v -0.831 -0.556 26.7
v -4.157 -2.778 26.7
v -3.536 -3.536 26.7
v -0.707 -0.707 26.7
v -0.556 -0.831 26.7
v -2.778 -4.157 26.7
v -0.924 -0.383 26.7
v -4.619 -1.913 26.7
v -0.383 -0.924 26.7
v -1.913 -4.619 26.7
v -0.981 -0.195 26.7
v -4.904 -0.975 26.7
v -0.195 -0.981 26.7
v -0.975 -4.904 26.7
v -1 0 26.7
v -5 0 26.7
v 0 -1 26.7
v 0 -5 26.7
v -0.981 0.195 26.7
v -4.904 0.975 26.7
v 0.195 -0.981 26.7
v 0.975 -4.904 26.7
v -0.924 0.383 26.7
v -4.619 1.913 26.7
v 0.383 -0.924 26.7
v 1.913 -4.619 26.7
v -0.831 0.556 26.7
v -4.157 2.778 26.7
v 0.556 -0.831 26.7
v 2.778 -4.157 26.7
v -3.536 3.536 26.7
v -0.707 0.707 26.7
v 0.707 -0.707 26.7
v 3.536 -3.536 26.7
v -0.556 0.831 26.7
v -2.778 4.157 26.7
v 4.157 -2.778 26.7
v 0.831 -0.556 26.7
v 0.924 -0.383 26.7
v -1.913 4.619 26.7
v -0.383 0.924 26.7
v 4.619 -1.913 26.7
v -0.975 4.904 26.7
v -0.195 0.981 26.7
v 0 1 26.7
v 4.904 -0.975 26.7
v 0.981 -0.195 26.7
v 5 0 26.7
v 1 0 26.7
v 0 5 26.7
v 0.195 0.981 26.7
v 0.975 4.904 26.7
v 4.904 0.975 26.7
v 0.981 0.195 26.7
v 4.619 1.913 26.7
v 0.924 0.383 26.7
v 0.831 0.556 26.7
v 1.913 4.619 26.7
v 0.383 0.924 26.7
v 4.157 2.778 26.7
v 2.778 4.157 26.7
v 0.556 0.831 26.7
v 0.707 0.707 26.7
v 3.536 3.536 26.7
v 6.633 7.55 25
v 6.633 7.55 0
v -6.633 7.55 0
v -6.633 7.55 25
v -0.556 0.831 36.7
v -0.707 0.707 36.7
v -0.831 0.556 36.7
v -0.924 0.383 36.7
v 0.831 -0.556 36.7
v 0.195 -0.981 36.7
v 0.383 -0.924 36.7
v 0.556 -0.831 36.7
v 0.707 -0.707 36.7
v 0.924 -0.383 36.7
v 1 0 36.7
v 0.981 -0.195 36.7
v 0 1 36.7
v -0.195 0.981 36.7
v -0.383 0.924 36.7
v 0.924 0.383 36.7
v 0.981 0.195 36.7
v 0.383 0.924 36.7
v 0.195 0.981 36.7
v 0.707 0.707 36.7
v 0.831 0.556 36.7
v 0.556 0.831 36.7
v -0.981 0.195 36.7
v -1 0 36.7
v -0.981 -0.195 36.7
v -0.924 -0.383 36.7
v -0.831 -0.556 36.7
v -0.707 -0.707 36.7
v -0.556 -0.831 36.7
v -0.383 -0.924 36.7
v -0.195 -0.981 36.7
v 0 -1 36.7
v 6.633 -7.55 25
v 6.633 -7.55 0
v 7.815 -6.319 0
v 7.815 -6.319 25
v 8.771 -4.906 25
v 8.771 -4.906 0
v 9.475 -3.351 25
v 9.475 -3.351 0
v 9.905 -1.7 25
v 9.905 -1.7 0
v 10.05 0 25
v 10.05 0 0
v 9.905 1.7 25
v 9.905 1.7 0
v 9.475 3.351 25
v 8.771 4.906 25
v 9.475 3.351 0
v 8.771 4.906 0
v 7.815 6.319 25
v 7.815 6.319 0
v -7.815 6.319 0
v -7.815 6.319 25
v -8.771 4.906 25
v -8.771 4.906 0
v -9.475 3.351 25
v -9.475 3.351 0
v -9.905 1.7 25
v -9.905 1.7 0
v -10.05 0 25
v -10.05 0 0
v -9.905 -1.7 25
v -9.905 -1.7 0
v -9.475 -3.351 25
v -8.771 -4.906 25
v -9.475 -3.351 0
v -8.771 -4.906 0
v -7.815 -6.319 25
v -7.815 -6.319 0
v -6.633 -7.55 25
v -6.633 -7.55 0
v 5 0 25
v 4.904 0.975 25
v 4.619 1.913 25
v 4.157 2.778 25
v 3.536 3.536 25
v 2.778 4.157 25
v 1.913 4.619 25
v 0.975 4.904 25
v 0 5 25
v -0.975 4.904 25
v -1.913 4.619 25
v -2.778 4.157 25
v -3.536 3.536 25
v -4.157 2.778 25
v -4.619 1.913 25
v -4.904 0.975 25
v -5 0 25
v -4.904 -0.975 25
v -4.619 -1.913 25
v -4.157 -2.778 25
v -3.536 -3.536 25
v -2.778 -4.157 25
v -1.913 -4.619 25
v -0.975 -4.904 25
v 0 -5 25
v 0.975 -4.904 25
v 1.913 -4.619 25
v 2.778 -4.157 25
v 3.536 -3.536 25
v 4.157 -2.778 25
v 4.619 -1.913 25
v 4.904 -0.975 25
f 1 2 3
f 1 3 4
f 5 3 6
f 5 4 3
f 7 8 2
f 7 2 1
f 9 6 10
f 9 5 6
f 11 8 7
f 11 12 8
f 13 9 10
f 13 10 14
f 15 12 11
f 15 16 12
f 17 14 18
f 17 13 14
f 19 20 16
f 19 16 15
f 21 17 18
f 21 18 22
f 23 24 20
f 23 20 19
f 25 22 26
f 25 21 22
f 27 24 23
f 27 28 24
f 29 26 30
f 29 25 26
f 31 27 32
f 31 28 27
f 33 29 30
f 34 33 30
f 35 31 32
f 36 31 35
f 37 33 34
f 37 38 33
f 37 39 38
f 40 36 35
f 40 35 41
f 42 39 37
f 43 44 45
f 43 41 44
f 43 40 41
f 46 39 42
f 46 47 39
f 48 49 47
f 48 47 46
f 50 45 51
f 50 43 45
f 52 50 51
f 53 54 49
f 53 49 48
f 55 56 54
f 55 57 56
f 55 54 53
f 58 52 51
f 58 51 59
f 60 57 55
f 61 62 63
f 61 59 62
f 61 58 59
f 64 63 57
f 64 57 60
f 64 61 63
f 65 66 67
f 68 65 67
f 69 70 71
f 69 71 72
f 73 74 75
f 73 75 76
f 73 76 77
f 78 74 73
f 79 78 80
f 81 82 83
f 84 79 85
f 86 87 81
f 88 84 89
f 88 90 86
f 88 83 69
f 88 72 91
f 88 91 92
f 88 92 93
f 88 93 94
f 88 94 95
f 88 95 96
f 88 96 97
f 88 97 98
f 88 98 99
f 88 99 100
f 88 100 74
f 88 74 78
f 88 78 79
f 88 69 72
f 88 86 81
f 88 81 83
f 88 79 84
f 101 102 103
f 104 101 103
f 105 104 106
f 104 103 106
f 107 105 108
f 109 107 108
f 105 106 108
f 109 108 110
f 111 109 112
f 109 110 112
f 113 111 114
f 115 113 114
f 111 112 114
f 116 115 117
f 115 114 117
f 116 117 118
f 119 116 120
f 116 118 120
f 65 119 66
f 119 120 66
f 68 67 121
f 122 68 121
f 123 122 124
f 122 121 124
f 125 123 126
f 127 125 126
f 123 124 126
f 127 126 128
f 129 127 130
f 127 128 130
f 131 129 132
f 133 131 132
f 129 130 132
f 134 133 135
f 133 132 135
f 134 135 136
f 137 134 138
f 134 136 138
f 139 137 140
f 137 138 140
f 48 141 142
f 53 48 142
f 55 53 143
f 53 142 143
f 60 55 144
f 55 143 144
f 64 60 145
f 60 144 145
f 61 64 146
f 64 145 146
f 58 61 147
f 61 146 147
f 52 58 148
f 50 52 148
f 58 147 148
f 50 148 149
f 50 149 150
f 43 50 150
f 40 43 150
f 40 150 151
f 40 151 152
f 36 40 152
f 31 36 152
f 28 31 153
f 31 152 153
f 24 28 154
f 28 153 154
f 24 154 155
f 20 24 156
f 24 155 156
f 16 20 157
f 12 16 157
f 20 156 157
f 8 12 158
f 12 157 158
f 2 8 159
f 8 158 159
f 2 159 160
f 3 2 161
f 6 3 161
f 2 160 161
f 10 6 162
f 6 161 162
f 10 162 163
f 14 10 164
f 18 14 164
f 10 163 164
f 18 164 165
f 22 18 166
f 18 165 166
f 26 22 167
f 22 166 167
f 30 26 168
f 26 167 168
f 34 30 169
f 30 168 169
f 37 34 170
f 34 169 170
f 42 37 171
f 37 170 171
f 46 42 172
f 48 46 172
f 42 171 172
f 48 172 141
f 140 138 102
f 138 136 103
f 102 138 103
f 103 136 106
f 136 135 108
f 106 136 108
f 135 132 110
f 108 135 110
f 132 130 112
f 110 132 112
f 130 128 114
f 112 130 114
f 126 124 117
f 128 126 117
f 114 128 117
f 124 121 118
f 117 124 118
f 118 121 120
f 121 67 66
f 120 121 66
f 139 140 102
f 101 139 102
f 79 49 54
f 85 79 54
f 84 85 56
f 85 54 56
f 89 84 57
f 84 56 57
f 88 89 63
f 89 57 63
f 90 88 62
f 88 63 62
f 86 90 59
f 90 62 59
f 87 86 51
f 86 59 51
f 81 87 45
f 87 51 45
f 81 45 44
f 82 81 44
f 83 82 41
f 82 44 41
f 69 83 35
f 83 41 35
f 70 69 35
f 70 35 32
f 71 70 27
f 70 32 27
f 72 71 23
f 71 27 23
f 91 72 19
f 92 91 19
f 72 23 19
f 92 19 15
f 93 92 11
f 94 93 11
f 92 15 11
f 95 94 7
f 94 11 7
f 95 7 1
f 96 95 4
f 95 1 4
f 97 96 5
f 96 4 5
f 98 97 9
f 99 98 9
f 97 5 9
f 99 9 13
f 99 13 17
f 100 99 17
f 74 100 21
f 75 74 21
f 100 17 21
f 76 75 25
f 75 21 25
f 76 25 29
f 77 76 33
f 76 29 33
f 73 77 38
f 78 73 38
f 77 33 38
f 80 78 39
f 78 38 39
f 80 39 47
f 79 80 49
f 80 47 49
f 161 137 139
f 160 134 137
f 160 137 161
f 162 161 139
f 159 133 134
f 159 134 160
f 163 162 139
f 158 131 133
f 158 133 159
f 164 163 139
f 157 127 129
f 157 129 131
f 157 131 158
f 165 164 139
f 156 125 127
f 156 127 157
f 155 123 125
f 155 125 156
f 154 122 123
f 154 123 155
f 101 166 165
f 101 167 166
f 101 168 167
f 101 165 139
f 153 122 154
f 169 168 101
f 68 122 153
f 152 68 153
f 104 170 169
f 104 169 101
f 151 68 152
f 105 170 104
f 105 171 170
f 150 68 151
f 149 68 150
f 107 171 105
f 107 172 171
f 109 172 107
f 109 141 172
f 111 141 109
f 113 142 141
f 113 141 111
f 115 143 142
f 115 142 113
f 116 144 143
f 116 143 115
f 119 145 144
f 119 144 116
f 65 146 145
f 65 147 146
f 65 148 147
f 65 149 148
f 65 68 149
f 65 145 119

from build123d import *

# Parameters (mm, degrees)
BOSS_EXTRUDE1_DEPTH = 25
SKETCH2_R           = 5
BOSS_EXTRUDE2_DEPTH = 1.7
SKETCH3_R           = 1
BOSS_EXTRUDE3_DEPTH = 10


with BuildPart() as part:
    # Sketch1 → Boss-Extrude1 (new body)
    with BuildSketch(Plane.XY):
        with BuildLine():
            Line((-6.633249581, -7.55), (6.633249581, -7.55))
            ThreePointArc((6.633249581, -7.55), (10.05, 0), (6.633249581, 7.55))
            Line((6.633249581, 7.55), (-6.633249581, 7.55))
            ThreePointArc((-6.633249581, 7.55), (-10.05, 0), (-6.633249581, -7.55))
        make_face()
    extrude(amount=BOSS_EXTRUDE1_DEPTH)

    # Sketch2 → Boss-Extrude2 (add)
    with BuildSketch(Plane.XY.offset(25)):
        Circle(SKETCH2_R)
    extrude(amount=BOSS_EXTRUDE2_DEPTH)

    # Sketch3 → Boss-Extrude3 (add)
    with BuildSketch(Plane.XY.offset(26.7)):
        Circle(SKETCH3_R)
    extrude(amount=BOSS_EXTRUDE3_DEPTH)


solid = part.part
